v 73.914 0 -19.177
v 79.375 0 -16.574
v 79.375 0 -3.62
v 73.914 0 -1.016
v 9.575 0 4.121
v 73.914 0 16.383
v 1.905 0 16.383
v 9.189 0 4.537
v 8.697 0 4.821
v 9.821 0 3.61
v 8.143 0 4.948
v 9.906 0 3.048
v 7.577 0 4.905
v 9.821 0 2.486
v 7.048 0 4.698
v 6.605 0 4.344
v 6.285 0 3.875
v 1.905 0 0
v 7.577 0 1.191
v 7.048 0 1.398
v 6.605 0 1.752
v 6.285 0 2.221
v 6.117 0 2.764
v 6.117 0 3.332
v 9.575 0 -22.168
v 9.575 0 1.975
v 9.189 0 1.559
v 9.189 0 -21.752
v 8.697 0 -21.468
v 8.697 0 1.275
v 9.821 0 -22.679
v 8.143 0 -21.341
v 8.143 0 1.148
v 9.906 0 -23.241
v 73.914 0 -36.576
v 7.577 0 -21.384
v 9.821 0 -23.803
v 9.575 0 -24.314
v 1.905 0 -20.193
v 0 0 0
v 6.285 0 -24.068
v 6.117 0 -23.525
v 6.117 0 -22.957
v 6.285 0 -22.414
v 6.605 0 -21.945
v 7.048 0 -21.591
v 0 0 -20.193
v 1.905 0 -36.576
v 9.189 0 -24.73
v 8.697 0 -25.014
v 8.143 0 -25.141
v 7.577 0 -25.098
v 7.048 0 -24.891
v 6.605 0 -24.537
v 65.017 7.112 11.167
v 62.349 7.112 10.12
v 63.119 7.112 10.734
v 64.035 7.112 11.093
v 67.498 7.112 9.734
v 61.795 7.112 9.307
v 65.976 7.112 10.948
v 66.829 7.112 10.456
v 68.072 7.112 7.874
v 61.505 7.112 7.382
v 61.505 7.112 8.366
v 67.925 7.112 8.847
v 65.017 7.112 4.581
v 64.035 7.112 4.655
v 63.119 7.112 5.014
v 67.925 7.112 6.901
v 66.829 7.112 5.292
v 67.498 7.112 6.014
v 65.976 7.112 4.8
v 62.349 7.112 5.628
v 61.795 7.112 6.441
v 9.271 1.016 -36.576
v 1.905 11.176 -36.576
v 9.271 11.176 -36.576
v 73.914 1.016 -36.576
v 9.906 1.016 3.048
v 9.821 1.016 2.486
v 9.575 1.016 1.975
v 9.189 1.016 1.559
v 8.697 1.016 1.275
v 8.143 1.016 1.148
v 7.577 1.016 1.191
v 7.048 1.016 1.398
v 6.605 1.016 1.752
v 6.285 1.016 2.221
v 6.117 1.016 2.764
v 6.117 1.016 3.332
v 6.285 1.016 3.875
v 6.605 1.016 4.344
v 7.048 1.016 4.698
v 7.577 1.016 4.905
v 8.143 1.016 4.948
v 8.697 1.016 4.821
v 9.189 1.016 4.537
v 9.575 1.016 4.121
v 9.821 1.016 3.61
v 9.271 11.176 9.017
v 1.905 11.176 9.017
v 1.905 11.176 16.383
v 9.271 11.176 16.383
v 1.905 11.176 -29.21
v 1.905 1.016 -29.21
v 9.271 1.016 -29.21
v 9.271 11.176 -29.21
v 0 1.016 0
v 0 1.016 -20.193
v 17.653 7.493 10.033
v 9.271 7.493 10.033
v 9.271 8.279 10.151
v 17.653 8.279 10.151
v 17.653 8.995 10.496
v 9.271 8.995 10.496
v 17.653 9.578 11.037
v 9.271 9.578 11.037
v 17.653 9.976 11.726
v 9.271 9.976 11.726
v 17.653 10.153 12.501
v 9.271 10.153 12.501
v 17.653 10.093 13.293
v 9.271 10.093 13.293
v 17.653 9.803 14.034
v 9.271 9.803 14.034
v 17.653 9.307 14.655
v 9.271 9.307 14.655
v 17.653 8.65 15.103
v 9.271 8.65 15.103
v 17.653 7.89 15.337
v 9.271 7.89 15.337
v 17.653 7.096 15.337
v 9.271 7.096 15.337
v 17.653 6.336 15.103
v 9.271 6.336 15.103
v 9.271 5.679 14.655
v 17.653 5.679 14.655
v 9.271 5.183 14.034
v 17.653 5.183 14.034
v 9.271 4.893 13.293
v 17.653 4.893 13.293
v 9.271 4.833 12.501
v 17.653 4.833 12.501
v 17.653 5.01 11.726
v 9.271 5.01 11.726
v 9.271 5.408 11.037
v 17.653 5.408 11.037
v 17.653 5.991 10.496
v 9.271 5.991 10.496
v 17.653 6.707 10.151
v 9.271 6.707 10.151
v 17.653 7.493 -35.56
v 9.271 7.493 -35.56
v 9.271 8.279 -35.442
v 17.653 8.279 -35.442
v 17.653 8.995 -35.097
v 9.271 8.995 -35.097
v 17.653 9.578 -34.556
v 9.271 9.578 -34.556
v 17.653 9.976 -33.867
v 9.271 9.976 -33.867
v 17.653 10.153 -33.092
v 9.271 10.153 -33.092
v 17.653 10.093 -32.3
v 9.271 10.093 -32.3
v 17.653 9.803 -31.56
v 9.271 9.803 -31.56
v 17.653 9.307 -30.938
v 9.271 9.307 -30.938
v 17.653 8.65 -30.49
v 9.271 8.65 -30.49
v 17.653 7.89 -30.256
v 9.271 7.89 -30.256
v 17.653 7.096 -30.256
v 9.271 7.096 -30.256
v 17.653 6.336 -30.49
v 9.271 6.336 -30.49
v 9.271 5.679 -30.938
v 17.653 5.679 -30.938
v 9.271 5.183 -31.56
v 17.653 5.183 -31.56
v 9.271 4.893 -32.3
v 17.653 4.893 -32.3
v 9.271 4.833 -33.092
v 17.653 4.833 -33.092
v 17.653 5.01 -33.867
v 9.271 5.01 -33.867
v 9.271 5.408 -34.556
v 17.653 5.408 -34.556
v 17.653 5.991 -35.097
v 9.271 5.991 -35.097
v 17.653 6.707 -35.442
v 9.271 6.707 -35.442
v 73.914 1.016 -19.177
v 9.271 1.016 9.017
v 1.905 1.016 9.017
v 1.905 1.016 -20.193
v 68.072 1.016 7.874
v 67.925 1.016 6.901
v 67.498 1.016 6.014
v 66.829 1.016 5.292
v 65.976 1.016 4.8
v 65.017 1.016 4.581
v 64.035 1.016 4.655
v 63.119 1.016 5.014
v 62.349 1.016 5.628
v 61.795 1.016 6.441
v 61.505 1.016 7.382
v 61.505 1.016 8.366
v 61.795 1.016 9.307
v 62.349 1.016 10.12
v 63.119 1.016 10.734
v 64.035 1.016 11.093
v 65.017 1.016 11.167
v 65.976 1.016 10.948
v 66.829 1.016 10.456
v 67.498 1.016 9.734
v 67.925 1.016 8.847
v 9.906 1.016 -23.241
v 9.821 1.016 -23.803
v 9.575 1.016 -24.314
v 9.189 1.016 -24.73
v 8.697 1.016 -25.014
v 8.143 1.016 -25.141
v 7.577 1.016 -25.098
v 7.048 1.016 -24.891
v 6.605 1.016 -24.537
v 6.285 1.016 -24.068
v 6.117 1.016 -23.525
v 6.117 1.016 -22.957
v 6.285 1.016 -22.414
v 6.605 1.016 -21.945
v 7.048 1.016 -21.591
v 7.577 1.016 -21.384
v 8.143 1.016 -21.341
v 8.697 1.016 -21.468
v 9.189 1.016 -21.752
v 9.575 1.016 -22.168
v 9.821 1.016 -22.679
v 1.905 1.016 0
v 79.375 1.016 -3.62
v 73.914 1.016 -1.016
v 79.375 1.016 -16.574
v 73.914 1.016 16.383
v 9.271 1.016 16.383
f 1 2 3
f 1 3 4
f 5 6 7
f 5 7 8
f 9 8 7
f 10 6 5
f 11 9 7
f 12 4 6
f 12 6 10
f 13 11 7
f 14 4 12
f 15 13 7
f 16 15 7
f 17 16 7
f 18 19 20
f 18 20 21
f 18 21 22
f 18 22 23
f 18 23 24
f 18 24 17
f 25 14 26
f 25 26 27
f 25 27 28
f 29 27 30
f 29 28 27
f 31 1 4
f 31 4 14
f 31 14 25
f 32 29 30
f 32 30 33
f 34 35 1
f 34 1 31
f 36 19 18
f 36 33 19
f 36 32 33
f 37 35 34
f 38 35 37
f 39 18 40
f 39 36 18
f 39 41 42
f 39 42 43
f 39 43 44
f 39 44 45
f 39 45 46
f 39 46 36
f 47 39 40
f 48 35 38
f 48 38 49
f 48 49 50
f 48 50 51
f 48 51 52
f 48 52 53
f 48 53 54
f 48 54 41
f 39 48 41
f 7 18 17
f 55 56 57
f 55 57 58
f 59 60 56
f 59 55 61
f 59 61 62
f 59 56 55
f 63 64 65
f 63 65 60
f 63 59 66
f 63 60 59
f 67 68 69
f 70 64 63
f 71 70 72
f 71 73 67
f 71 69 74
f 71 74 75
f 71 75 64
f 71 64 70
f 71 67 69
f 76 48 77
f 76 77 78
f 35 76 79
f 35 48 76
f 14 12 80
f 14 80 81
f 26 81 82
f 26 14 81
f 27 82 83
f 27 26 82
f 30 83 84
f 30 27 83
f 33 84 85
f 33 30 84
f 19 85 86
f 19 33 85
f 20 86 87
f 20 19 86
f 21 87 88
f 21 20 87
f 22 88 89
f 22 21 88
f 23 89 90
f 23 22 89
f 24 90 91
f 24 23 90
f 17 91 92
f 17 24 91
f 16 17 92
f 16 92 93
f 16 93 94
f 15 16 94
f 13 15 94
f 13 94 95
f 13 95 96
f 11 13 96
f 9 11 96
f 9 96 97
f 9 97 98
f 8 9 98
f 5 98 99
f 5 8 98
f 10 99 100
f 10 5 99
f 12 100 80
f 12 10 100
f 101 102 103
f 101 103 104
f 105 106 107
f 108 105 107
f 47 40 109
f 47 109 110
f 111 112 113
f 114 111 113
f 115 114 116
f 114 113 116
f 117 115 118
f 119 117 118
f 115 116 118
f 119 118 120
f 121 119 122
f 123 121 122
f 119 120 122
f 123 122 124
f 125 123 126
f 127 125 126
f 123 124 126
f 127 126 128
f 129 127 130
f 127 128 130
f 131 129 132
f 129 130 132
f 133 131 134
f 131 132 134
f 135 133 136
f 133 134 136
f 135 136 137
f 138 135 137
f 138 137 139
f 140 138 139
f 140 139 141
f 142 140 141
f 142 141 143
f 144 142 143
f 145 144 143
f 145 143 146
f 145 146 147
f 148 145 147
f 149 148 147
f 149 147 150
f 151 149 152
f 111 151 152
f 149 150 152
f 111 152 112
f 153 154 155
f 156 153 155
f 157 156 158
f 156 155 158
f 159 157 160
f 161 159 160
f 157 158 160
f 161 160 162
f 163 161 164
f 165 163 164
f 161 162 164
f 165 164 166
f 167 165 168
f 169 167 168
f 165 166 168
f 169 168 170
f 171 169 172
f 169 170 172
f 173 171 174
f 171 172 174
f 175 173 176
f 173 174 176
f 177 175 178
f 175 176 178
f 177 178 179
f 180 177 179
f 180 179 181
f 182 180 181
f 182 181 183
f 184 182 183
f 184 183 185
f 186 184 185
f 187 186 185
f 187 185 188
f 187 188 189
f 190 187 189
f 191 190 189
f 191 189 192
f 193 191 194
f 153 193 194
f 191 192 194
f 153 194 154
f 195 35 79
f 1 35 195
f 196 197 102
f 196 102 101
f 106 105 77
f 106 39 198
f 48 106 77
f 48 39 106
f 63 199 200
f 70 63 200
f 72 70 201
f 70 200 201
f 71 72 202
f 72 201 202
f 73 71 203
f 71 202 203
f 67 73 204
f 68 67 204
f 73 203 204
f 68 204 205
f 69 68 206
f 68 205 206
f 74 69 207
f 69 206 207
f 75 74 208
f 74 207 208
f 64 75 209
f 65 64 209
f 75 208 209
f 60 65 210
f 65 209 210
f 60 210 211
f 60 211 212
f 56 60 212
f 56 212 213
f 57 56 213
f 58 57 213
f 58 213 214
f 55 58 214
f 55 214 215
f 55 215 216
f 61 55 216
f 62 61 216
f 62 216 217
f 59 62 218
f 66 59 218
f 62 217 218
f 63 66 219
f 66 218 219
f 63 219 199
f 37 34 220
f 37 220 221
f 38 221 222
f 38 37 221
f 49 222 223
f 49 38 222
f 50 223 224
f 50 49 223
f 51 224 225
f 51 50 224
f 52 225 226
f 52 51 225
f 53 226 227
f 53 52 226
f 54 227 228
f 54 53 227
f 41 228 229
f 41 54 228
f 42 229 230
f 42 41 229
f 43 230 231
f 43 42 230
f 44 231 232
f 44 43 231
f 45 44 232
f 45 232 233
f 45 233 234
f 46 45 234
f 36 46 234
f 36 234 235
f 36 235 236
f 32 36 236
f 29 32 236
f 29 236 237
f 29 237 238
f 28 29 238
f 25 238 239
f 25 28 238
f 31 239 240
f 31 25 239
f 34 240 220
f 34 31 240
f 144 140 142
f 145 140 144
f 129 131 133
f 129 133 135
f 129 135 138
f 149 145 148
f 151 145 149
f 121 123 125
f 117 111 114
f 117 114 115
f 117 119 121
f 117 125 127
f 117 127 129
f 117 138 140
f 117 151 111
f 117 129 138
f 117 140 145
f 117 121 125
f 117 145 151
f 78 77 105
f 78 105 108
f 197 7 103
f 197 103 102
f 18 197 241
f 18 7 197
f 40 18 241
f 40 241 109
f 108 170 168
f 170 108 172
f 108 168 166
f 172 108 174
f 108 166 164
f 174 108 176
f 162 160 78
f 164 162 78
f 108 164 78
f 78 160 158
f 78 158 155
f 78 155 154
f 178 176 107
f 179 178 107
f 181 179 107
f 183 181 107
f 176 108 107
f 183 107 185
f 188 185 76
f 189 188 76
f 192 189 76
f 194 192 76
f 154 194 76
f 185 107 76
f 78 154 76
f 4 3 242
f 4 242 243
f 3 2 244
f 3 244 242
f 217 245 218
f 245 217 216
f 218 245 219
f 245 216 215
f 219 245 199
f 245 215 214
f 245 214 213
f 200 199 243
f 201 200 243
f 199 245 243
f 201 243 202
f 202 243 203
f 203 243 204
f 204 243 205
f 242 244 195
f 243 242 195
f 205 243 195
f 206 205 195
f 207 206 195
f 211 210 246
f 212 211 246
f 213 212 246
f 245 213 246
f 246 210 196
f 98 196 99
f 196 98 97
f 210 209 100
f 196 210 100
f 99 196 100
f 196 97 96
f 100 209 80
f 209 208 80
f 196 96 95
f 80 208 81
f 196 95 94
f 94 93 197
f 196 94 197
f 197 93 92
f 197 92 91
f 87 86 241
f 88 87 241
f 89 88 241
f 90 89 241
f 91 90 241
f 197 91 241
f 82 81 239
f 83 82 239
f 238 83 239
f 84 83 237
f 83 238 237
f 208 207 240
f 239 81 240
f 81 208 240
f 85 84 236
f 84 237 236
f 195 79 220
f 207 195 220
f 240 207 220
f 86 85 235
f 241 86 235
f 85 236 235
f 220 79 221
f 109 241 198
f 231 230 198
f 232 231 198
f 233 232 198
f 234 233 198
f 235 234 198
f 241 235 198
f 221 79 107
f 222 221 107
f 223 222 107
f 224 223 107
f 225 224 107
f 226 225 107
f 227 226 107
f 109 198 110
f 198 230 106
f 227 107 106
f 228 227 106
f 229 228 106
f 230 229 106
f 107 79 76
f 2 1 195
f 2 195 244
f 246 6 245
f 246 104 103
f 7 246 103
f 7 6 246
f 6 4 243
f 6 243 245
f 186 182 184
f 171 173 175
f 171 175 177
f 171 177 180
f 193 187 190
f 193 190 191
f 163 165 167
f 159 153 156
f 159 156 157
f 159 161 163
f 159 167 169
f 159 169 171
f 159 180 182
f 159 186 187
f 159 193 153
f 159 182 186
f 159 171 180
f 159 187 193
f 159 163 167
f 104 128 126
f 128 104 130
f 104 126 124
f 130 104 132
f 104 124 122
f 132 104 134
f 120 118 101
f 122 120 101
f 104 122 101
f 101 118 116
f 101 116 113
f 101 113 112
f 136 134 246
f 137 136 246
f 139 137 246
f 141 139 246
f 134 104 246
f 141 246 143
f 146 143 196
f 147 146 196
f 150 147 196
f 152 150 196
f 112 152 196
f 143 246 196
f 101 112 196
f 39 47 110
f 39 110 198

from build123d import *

# Parameters (mm, degrees)
SKETCH1_R           = 1.905
BOSS_EXTRUDE1_DEPTH = 1.016
SKETCH2_W           = 7.366
SKETCH2_H           = 7.366
BOSS_EXTRUDE2_DEPTH = 10.16
SKETCH3_R           = 2.667
BOSS_EXTRUDE3_DEPTH = 8.382
SKETCH4_R           = 3.302
BOSS_EXTRUDE4_DEPTH = 6.096


with BuildPart() as part:
    # Sketch1 → Boss-Extrude1 (new body)
    with BuildSketch(Plane(origin=(0, 0, 0), x_dir=(1, 0, 0), z_dir=(0, 1, 0))):
        Polygon((0, 0), (0, 20.193), (1.905, 20.193), (1.905, 36.576), (73.914, 36.576), (73.914, 19.177), (79.375, 16.5735), (79.375, 3.6195), (73.914, 1.016), (73.914, -16.383), (1.905, -16.383), (1.905, 0), align=None)
        with Locations((8.001, -3.048)):
            Circle(SKETCH1_R, mode=Mode.SUBTRACT)
        with Locations((8.001, 23.241)):
            Circle(SKETCH1_R, mode=Mode.SUBTRACT)
    extrude(amount=BOSS_EXTRUDE1_DEPTH)

    # Sketch2 → Boss-Extrude2 (add)
    with BuildSketch(Plane(origin=(0, 1.016, 0), x_dir=(1, 0, 0), z_dir=(0, 1, 0))):
        with Locations((5.588, 32.893)):
            Rectangle(SKETCH2_W, SKETCH2_H)
        with Locations((5.588, -12.7)):
            Rectangle(SKETCH2_W, SKETCH2_H)
    extrude(amount=BOSS_EXTRUDE2_DEPTH)

    # Sketch3 → Boss-Extrude3 (add)
    with BuildSketch(Plane(origin=(9.271, 0, 0), x_dir=(0, 0, -1), z_dir=(1, 0, 0))):
        with Locations((-12.7, 7.493)):
            Circle(SKETCH3_R)
        with Locations((32.893, 7.493)):
            Circle(SKETCH3_R)
    extrude(amount=BOSS_EXTRUDE3_DEPTH)

    # Sketch4 → Boss-Extrude4 (add)
    with BuildSketch(Plane(origin=(0, 1.016, 0), x_dir=(1, 0, 0), z_dir=(0, 1, 0))):
        with Locations((64.77, -7.874)):
            Circle(SKETCH4_R)
    extrude(amount=BOSS_EXTRUDE4_DEPTH)


solid = part.part
